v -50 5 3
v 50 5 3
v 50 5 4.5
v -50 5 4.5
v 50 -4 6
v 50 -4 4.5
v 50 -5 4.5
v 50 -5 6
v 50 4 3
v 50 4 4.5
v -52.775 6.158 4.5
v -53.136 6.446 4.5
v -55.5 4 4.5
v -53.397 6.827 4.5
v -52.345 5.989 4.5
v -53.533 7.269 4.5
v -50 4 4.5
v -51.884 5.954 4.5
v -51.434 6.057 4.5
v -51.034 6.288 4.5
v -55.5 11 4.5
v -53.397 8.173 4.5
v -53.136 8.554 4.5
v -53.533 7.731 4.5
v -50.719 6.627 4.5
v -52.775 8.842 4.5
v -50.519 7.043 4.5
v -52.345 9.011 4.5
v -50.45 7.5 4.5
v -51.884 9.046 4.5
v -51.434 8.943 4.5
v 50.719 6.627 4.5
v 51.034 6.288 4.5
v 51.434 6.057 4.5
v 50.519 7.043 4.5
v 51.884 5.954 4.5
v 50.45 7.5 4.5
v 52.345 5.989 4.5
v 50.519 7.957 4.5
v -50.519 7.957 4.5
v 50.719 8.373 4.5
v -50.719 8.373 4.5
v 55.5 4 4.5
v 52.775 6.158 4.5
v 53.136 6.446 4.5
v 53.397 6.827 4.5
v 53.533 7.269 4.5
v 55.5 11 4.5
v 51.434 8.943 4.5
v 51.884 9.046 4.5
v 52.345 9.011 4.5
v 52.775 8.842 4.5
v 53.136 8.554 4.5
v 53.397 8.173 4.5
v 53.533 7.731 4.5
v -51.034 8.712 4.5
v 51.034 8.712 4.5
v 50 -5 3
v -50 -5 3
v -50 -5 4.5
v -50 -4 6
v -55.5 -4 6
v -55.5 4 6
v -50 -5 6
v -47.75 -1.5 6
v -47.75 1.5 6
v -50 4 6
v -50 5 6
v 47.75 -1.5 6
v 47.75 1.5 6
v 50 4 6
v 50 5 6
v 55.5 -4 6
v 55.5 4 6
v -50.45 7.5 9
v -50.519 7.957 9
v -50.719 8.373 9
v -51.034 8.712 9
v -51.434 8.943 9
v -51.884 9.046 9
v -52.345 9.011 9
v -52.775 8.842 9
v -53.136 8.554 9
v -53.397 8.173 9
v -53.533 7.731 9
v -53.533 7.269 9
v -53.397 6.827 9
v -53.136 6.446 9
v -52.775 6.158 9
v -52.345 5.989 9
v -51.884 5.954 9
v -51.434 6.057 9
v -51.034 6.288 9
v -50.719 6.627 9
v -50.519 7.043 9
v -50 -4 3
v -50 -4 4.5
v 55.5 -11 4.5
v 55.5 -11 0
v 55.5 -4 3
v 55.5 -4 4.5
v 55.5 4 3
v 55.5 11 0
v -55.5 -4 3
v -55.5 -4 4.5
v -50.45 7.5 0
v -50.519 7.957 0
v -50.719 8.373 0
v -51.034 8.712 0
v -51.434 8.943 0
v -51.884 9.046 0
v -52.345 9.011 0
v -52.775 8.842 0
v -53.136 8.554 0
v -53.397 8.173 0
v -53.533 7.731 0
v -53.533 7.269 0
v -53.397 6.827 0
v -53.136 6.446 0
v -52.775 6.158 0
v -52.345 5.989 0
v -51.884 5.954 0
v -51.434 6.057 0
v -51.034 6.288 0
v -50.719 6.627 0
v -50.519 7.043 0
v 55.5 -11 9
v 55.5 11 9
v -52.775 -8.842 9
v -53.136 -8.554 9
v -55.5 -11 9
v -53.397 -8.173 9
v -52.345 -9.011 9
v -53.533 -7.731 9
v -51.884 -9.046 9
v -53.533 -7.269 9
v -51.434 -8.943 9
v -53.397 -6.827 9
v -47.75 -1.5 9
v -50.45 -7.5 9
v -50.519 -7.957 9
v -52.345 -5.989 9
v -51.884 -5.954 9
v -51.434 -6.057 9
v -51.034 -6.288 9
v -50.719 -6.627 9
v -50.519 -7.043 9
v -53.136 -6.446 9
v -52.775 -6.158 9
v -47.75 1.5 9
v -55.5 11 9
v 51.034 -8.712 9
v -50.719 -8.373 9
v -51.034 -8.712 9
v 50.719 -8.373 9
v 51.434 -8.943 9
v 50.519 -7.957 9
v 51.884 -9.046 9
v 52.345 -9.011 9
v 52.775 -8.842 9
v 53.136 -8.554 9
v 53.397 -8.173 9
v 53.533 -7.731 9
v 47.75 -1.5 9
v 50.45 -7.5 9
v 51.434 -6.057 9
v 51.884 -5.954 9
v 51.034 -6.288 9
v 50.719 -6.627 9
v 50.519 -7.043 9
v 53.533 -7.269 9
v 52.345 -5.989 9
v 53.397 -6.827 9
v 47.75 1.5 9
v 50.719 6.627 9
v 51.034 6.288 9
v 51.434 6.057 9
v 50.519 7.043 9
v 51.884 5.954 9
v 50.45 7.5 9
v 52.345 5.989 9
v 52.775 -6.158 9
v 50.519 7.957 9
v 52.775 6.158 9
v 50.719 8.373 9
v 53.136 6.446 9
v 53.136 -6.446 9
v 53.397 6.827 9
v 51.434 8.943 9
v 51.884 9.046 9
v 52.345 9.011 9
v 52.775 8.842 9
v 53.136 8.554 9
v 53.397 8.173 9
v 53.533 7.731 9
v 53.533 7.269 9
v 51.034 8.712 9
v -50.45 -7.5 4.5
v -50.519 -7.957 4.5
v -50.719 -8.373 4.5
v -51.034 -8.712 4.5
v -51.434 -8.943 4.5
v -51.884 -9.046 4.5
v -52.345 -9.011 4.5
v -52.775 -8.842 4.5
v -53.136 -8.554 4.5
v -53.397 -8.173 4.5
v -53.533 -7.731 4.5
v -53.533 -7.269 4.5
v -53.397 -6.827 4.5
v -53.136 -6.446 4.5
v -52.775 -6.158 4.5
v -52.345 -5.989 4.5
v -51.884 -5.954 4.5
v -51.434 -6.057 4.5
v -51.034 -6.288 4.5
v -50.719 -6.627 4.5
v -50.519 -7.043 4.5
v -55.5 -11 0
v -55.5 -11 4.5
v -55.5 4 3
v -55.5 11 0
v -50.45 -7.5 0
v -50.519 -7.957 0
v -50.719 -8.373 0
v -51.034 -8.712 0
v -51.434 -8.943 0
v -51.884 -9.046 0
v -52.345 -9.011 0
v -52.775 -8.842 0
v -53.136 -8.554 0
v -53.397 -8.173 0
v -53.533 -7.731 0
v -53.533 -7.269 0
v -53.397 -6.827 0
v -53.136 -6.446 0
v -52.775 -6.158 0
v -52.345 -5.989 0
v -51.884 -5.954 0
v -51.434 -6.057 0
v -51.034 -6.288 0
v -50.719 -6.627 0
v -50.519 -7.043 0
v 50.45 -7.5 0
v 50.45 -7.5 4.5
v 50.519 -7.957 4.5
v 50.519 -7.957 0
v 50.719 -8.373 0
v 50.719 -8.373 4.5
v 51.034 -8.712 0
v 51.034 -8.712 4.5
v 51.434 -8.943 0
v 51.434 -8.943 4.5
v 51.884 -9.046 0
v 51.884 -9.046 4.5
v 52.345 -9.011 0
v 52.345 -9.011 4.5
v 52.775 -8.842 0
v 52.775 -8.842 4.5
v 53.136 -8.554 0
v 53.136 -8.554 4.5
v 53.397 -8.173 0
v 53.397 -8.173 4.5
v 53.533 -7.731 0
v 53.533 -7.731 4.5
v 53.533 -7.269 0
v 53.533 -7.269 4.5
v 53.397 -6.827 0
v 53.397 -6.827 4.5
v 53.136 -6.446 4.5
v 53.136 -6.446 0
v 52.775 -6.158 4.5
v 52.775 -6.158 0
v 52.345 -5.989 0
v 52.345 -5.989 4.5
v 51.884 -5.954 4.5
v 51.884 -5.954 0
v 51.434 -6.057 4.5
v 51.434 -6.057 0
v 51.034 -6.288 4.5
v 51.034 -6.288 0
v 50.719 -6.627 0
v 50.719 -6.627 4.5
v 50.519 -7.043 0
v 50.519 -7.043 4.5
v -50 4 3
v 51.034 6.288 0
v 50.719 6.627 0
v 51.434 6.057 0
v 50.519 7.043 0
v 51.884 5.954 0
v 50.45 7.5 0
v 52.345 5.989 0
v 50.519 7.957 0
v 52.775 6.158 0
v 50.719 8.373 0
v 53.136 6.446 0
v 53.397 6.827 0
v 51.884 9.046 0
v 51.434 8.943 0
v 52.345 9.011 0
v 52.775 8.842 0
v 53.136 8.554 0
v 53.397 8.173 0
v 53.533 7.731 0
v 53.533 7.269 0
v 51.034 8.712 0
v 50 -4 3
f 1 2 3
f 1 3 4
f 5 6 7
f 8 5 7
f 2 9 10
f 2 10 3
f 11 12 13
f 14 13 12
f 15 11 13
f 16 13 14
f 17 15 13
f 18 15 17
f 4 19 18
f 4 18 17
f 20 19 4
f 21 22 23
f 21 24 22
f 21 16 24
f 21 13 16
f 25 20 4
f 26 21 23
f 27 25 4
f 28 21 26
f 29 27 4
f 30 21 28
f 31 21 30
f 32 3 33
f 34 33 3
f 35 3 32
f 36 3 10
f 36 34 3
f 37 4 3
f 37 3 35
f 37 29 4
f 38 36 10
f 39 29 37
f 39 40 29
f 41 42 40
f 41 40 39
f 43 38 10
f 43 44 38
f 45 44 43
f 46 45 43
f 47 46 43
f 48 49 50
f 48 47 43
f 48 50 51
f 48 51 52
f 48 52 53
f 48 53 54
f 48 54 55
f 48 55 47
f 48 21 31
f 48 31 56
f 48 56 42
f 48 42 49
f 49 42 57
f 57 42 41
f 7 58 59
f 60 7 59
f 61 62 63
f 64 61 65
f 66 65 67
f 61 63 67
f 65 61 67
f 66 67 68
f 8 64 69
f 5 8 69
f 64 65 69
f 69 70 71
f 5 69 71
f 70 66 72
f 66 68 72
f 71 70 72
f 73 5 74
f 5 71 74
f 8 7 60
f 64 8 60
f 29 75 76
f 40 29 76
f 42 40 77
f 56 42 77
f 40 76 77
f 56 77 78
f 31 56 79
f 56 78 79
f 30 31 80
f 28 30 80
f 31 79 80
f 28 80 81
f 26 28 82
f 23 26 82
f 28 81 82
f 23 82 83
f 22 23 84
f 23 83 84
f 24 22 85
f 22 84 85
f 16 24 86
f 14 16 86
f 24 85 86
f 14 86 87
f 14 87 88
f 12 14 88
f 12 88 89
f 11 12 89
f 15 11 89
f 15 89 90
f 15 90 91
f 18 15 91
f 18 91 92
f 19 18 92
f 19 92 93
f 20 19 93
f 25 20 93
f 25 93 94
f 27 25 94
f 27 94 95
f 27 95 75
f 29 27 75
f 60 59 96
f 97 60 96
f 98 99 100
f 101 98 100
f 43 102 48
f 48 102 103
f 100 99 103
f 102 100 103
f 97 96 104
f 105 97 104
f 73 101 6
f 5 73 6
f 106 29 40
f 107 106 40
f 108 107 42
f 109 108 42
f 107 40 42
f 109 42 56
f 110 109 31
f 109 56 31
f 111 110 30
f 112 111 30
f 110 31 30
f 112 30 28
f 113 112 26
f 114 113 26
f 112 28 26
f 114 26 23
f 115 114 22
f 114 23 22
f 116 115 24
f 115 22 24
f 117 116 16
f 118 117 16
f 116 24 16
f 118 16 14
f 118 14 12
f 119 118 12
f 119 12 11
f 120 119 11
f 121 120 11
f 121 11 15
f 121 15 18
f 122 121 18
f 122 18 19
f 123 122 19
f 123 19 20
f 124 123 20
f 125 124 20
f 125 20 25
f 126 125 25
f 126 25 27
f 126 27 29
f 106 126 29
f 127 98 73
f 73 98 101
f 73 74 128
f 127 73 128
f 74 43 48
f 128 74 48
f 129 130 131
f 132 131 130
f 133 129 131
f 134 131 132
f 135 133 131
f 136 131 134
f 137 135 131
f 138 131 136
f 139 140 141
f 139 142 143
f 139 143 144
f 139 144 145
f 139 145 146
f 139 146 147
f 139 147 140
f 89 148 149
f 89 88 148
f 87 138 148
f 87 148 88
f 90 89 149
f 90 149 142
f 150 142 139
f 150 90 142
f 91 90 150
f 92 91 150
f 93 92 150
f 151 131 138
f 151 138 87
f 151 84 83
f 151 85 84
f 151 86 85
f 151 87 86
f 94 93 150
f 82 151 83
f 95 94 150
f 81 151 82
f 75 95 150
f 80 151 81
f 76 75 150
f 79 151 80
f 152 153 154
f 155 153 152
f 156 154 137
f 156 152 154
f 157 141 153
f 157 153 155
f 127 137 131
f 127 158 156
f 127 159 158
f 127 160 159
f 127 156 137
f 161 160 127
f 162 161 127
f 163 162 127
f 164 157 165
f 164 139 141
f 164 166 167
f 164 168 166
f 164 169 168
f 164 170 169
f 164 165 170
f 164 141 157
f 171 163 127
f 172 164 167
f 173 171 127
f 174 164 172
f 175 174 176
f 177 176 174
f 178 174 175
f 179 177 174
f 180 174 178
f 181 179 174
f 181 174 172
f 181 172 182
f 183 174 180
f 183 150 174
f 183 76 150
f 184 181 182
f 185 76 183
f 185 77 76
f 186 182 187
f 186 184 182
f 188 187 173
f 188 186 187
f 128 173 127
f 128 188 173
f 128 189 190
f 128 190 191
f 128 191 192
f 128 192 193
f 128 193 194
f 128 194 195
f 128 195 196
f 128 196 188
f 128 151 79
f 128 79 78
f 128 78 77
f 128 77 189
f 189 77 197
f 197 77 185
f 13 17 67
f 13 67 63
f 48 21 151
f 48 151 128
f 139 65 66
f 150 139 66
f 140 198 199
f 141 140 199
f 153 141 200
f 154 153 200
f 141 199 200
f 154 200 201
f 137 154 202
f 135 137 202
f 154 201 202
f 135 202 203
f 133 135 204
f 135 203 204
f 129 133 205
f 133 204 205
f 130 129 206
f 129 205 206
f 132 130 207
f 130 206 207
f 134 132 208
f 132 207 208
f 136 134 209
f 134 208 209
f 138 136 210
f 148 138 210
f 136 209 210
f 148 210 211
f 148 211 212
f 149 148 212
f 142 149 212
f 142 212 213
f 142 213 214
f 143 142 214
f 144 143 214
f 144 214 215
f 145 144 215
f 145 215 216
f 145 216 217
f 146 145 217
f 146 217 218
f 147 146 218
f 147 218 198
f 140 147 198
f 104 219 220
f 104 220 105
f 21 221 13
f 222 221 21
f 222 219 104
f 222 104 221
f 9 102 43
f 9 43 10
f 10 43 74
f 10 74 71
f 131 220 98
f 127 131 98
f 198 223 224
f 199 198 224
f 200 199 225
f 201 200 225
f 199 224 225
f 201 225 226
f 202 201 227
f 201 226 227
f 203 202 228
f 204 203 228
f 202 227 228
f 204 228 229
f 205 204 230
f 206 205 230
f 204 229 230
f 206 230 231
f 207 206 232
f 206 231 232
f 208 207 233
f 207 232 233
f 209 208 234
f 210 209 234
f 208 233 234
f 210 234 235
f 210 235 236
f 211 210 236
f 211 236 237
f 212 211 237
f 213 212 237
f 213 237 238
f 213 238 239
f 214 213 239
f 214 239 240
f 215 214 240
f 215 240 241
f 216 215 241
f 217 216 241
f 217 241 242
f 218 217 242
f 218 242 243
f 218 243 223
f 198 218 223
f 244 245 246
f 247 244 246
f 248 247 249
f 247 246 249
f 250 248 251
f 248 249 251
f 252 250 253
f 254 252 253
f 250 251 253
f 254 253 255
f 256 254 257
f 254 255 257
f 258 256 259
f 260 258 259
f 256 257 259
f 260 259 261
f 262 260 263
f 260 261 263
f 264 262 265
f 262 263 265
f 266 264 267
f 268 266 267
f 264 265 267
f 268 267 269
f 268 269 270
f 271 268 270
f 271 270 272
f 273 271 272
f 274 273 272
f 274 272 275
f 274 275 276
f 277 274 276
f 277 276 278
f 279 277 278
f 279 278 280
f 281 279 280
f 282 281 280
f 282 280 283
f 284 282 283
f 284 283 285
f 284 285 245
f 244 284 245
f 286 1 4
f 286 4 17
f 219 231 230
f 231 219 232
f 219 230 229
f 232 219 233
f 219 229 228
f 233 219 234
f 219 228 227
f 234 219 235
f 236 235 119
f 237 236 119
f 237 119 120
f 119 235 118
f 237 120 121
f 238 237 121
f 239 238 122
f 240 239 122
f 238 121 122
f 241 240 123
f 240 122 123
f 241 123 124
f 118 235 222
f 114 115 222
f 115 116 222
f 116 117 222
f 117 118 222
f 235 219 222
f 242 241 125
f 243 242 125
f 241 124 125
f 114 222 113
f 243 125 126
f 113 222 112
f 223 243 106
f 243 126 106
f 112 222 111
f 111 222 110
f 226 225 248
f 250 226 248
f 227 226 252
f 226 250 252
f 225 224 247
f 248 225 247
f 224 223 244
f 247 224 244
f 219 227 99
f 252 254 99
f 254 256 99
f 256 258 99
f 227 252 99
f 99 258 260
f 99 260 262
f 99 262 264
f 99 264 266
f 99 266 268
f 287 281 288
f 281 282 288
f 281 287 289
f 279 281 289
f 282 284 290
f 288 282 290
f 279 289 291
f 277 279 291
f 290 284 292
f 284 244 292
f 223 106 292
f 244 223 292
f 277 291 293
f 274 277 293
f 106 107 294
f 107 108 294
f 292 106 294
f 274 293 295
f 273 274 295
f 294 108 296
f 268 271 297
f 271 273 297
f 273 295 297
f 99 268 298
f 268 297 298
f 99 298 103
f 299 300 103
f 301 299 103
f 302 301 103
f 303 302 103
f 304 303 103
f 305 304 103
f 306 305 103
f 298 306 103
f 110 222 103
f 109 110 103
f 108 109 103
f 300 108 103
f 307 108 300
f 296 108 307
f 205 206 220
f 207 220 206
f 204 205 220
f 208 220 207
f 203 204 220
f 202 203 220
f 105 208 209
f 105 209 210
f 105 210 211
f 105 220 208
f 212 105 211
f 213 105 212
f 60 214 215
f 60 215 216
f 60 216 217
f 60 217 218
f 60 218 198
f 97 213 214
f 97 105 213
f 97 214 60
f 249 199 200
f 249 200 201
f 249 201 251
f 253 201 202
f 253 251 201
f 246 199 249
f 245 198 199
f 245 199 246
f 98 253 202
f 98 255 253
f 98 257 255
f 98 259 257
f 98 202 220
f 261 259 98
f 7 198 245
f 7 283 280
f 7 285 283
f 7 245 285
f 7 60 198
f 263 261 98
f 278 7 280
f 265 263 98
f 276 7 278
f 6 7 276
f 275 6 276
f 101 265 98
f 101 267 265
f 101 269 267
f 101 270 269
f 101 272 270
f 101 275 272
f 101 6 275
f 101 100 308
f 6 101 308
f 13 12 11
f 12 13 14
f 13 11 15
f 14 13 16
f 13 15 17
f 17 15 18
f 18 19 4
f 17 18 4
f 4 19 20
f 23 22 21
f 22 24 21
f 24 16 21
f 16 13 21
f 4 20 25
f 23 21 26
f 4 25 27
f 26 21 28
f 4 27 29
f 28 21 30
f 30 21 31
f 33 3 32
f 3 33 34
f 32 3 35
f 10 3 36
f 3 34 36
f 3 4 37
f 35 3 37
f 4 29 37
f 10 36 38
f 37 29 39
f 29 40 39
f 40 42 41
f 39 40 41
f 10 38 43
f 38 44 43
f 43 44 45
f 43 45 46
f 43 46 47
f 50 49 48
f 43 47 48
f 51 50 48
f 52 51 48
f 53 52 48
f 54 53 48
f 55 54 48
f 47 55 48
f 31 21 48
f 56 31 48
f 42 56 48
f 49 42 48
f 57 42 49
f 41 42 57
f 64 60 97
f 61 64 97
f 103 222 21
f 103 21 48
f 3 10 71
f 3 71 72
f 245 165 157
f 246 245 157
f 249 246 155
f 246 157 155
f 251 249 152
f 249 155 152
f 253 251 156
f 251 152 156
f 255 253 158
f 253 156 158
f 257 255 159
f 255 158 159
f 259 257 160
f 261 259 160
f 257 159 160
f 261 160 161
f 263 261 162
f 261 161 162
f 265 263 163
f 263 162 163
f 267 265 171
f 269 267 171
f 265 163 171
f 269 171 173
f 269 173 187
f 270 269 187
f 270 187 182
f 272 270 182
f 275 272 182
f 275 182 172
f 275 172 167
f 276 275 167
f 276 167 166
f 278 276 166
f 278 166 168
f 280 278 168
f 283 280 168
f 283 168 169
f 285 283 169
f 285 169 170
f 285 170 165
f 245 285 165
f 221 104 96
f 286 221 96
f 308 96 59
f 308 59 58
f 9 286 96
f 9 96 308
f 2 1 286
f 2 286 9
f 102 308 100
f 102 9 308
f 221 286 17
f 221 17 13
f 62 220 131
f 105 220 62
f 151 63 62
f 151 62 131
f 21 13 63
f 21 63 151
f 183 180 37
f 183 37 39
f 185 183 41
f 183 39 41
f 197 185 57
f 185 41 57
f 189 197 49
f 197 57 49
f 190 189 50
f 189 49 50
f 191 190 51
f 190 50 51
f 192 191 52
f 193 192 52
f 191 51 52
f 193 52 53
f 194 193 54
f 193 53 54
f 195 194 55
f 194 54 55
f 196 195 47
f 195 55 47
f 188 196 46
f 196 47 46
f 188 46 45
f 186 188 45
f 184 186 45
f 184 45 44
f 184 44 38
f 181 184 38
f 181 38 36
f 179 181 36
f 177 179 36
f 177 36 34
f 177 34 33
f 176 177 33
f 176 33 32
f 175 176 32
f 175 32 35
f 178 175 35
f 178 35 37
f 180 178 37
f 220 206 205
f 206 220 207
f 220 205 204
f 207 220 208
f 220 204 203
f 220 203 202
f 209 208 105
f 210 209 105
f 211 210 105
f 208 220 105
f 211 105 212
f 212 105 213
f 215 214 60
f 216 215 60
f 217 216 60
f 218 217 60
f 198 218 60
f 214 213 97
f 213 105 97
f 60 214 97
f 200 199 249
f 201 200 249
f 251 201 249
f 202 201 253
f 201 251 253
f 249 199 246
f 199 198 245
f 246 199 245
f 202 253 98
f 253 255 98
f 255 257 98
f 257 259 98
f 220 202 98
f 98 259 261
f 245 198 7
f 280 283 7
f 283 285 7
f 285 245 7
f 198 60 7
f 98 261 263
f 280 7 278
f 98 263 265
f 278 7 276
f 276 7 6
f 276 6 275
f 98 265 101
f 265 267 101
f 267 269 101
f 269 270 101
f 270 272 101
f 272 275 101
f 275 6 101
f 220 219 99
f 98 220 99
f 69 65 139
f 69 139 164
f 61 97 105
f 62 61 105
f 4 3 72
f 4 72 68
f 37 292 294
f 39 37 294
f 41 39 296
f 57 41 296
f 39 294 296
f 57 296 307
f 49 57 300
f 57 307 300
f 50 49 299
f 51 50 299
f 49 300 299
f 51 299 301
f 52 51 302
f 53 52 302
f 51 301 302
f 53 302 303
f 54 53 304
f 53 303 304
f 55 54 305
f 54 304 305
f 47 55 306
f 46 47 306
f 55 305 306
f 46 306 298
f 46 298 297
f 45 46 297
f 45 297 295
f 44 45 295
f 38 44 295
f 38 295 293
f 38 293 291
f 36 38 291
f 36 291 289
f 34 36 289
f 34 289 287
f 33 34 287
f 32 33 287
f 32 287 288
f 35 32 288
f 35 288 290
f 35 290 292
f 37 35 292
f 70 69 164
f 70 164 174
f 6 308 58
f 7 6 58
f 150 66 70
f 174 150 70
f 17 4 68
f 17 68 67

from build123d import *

# Parameters (mm, degrees)
BOX_BOTTOM_HALF_0_W     = 113
BOX_BOTTOM_HALF_0_H     = 24
BOX_BOTTOM_HALF_0_DEPTH = 5.5
SKETCH_W                = 111
SKETCH_H                = 22
PAD_DEPTH               = 3
PAD001_DEPTH            = 3
SKETCH002_W             = 111
SKETCH002_H             = 22
SKETCH002_W_2           = 95.5
SKETCH002_H_2           = 3
PAD002_DEPTH            = 3
SKETCH003_R             = 1.55
POCKET_DEPTH            = 236.034037
POLARPATTERN_COUNT      = 2
POLARPATTERN001_COUNT   = 2
POLARPATTERN002_COUNT   = 2


with BuildPart() as box_bottom_half_0_body:
    # box_bottom_half_0 → box_bottom_half_0 (new body)
    with BuildSketch(Plane(origin=(-56.5, -12, -1), x_dir=(1, 0, 0), z_dir=(0, 0, 1))):
        with Locations((56.5, 12)):
            Rectangle(BOX_BOTTOM_HALF_0_W, BOX_BOTTOM_HALF_0_H)
    extrude(amount=BOX_BOTTOM_HALF_0_DEPTH)


with BuildPart() as body:
    # Sketch → Pad (new body)
    with BuildSketch(Plane.XY):
        Rectangle(SKETCH_W, SKETCH_H)
    extrude(amount=PAD_DEPTH)

    # Sketch001 (on Face6 of Pad) → Pad001 (join)
    with BuildSketch(Plane.XY.offset(3)):
        Polygon((-55.5, 11), (55.5, 11), (55.5, 4), (50, 4), (50, 5), (-50, 5), (-50, 4), (-55.5, 4), align=None)
        Polygon((-55.5, -11), (55.5, -11), (55.5, -4), (50, -4), (50, -5), (-50, -5), (-50, -4), (-55.5, -4), align=None)
    extrude(amount=PAD001_DEPTH)

    # Sketch002 (on Face12 of Pad001) → Pad002 (join)
    with BuildSketch(Plane.XY.offset(6)):
        Rectangle(SKETCH002_W, SKETCH002_H)
        Rectangle(SKETCH002_W_2, SKETCH002_H_2, mode=Mode.SUBTRACT)
    extrude(amount=PAD002_DEPTH)

    # Sketch003 (on Face26 of Pad002) → Pocket (cut, through all)
    with BuildSketch(Plane.XY.offset(9)):
        with Locations((-52, 7.5)):
            Circle(SKETCH003_R)
    pocket = extrude(amount=-POCKET_DEPTH, mode=Mode.SUBTRACT)

    # PolarPattern: Pocket ×2 about axis
    polarpattern_axis = Axis((0, 0, 0), (0, 1, 0))
    for i in range(1, POLARPATTERN_COUNT):
        add(pocket.rotate(polarpattern_axis, i * 360 / POLARPATTERN_COUNT), mode=Mode.SUBTRACT)

    # PolarPattern001: Pocket ×2 about axis
    polarpattern001_axis = Axis((0, 0, 0), (1, 0, 0))
    for i in range(1, POLARPATTERN001_COUNT):
        add(pocket.rotate(polarpattern001_axis, i * 360 / POLARPATTERN001_COUNT), mode=Mode.SUBTRACT)

    # PolarPattern002: Pocket ×2 about axis
    polarpattern002_axis = Axis((0, 0, 9), (0, 0, 1))
    for i in range(1, POLARPATTERN002_COUNT):
        add(pocket.rotate(polarpattern002_axis, i * 360 / POLARPATTERN002_COUNT), mode=Mode.SUBTRACT)


with BuildPart() as bottom_half_0_body:
    # bottom_half_0 base: copy of Body
    add(body.part)

    # bottom_half_0: intersect box_bottom_half_0 body
    add(box_bottom_half_0_body.part, mode=Mode.INTERSECT)


with BuildPart() as top_half_0_body:
    # top_half_0 base: copy of Body
    add(body.part)

    # top_half_0: cut box_bottom_half_0 body
    add(box_bottom_half_0_body.part, mode=Mode.SUBTRACT)


solid = Compound([bottom_half_0_body.part, top_half_0_body.part])
